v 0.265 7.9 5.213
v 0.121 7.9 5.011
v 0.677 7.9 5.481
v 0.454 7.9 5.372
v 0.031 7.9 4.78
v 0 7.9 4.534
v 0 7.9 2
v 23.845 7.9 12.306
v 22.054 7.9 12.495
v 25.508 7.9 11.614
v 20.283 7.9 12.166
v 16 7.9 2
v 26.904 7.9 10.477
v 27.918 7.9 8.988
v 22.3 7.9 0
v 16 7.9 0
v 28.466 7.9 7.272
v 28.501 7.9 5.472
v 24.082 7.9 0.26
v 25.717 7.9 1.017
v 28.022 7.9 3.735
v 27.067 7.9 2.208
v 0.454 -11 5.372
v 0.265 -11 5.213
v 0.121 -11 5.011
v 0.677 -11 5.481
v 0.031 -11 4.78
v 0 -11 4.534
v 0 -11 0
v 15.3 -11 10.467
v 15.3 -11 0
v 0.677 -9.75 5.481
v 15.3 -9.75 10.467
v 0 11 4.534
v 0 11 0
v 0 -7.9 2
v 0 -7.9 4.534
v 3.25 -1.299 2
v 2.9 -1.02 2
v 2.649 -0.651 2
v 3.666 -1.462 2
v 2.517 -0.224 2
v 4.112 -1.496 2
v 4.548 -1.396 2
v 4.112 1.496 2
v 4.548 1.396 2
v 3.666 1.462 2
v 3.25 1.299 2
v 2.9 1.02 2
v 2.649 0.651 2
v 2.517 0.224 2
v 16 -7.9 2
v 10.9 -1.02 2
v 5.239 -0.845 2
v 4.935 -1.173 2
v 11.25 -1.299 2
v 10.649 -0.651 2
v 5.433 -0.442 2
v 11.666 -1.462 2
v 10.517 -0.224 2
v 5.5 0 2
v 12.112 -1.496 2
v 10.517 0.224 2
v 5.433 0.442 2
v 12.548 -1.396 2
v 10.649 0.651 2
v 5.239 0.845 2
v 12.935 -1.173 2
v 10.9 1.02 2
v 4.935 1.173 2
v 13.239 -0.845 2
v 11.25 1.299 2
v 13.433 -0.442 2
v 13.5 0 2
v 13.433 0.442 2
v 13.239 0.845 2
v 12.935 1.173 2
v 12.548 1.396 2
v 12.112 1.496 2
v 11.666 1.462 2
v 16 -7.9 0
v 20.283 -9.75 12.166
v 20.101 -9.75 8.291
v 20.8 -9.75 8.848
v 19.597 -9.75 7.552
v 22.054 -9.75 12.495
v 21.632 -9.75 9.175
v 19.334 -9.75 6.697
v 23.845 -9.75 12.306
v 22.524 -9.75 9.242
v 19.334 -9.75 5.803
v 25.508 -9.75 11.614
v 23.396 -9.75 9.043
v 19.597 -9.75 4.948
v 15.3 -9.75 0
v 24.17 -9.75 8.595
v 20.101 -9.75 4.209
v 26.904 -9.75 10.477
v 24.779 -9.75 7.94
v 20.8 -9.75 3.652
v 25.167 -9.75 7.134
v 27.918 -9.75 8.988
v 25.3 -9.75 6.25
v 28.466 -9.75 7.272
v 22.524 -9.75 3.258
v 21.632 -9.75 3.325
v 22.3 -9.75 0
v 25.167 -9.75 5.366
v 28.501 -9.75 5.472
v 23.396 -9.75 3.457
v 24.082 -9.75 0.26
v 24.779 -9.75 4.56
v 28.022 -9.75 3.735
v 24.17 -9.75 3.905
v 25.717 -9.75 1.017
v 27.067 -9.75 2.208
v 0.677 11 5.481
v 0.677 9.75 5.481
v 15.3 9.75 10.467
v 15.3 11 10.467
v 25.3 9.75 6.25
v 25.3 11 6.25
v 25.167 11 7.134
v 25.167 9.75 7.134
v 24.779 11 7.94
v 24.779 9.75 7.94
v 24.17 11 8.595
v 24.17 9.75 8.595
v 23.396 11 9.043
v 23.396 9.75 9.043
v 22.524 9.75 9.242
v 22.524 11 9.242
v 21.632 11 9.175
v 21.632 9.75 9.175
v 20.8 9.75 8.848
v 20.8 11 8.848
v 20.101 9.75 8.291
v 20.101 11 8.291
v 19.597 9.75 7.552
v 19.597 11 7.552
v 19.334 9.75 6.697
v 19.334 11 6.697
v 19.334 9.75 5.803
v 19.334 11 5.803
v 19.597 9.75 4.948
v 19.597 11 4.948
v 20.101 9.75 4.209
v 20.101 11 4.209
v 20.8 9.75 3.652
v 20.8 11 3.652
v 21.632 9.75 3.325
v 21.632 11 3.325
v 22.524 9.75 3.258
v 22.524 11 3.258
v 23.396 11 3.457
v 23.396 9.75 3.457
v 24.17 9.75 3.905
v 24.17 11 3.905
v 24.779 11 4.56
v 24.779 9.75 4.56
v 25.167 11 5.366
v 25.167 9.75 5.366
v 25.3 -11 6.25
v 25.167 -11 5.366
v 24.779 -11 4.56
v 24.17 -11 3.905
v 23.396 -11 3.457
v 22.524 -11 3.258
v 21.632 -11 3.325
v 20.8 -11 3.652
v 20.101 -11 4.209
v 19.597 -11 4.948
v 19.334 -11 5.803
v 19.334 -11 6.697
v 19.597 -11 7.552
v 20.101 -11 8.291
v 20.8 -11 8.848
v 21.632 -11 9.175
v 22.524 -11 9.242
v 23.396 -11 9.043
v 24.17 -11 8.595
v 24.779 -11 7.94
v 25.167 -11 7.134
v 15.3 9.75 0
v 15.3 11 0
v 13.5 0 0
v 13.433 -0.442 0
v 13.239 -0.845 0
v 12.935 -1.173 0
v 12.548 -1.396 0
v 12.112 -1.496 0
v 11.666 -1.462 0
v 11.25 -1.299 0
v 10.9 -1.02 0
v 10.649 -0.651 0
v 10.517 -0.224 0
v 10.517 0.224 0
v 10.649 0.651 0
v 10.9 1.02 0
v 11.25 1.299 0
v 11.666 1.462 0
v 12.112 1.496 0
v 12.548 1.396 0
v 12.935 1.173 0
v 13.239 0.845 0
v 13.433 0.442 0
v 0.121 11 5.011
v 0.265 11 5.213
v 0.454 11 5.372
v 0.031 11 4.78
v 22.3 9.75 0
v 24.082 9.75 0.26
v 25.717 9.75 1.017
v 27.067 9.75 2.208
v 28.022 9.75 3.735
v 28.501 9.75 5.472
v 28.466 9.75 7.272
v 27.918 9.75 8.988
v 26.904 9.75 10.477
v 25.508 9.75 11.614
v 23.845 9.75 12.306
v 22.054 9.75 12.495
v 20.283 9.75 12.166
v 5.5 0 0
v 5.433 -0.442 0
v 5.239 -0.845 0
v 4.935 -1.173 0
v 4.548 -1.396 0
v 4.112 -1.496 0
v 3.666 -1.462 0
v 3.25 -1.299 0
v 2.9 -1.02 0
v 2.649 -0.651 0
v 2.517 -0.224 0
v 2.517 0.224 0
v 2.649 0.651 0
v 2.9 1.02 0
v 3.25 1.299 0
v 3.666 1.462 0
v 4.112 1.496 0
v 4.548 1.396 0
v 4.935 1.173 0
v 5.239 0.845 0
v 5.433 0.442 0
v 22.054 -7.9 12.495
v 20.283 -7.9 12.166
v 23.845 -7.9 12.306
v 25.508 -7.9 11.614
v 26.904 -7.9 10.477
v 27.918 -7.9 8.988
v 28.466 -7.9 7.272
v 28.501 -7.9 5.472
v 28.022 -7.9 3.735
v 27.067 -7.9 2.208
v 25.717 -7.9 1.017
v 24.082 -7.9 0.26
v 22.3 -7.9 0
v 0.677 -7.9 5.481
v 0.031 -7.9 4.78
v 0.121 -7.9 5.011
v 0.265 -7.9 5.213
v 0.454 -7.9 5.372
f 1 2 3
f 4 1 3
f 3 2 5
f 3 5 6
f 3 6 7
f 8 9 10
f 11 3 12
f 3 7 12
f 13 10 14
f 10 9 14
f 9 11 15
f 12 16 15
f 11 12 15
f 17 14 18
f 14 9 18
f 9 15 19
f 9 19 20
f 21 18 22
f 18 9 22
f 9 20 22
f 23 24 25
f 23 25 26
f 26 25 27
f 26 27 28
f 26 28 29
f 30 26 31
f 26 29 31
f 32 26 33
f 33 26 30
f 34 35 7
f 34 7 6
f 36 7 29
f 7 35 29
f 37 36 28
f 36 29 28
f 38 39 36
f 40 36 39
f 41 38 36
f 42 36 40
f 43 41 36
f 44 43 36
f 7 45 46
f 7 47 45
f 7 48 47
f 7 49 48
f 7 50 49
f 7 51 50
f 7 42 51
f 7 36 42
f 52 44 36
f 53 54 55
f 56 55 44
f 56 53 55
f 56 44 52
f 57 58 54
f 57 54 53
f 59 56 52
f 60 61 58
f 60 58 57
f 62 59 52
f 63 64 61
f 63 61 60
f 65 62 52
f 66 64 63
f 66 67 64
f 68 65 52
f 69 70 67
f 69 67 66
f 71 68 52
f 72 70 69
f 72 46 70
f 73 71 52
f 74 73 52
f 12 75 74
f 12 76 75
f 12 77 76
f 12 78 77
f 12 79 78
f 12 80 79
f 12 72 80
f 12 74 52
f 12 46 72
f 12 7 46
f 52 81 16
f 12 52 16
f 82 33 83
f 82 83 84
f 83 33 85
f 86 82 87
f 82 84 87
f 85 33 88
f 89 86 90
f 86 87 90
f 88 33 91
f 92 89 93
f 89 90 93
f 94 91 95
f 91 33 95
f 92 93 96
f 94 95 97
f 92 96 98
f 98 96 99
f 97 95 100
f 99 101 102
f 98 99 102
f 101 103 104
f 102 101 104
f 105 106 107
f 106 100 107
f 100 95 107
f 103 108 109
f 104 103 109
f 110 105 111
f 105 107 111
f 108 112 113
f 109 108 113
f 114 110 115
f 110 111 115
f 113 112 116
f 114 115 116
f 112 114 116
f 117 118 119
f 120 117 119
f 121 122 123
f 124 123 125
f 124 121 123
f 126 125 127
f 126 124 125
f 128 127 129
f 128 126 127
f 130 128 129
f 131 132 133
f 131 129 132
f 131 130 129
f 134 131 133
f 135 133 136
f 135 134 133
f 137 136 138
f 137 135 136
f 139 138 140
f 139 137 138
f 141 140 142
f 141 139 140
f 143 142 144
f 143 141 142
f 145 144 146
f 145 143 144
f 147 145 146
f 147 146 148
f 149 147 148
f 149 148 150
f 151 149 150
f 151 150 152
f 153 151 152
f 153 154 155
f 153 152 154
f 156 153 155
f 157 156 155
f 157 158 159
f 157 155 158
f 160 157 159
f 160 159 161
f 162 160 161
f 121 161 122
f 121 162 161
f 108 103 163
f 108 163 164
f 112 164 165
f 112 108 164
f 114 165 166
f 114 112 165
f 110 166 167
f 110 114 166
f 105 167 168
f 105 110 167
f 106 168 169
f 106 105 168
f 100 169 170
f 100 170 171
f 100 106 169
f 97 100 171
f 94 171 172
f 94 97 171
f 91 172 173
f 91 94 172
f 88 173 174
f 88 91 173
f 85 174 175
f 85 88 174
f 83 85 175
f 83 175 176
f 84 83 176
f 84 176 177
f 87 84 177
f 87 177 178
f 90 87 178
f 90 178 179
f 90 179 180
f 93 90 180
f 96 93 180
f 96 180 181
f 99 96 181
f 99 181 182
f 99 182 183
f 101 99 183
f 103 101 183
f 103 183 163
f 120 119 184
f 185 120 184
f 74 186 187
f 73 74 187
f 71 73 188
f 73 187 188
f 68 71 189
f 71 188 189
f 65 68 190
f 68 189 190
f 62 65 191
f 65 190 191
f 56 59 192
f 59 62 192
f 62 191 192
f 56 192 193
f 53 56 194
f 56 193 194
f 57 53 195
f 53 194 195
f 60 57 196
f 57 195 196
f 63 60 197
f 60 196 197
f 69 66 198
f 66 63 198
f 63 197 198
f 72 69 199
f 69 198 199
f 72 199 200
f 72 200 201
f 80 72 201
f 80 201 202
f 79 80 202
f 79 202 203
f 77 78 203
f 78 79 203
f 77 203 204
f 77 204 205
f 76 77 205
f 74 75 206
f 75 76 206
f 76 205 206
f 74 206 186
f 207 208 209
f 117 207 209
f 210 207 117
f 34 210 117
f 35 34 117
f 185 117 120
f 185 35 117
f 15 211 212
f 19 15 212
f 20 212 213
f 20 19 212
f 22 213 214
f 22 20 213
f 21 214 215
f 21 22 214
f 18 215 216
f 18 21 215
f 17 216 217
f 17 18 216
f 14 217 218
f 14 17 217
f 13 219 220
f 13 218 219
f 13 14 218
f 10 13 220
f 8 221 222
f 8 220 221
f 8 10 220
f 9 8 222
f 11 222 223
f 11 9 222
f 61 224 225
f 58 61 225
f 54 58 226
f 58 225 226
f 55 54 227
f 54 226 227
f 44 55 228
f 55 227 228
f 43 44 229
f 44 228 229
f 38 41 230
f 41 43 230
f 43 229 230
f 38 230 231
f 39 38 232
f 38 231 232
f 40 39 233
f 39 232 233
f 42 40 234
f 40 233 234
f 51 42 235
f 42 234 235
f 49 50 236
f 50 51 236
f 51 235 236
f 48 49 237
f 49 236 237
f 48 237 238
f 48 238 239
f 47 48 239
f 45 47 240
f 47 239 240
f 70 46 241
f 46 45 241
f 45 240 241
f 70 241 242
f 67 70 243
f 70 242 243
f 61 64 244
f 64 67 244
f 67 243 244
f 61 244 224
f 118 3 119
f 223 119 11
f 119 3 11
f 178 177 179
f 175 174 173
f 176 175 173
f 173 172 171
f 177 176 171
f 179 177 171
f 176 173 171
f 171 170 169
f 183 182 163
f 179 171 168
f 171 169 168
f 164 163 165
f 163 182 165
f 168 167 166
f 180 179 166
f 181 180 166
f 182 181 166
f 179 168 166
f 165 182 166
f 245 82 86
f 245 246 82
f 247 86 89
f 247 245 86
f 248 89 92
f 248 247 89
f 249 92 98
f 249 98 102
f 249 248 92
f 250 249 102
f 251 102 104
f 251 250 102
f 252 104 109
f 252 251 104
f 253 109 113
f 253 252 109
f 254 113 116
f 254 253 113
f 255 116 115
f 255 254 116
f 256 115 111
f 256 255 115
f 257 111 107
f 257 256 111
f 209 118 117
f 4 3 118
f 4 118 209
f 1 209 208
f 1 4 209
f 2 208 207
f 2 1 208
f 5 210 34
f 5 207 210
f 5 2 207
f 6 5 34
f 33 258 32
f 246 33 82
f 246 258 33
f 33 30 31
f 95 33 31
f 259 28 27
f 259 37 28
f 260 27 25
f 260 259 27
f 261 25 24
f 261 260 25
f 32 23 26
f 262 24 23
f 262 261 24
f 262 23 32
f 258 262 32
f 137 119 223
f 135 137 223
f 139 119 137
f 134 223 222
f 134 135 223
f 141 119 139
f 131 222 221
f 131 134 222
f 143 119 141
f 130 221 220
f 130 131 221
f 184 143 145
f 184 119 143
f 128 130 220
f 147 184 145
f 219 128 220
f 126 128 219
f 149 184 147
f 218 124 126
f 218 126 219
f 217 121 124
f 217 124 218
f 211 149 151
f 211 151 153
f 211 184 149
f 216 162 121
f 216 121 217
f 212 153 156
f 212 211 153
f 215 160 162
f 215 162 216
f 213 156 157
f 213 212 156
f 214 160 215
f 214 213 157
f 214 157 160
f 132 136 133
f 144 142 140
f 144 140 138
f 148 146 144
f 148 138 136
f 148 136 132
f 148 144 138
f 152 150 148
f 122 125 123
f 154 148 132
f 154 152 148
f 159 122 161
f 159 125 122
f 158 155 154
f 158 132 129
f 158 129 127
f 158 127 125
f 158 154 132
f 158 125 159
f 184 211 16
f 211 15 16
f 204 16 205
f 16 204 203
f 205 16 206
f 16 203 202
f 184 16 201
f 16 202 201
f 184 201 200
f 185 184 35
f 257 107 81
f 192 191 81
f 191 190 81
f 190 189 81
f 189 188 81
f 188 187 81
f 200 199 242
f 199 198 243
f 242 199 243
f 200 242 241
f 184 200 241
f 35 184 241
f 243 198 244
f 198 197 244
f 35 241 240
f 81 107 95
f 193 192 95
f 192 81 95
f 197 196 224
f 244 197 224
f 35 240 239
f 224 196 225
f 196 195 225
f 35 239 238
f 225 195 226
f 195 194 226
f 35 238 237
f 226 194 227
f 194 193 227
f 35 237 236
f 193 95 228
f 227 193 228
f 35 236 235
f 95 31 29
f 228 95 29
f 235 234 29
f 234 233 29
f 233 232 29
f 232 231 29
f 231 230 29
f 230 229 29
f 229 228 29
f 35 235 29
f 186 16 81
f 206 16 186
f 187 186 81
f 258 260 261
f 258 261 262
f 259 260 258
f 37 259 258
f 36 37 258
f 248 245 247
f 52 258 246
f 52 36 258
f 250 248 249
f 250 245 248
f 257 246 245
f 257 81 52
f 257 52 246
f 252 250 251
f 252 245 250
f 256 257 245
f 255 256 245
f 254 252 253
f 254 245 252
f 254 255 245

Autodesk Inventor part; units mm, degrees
sketch "Sketch_77" plane through (0, 0, 0) normal (0, 0, 1) x (1, 0, 0)
  line L0 (0, 7.9) -> (0, -7.9)
  line L1 (0, -7.9) -> (16, -7.9)
  line L2 (16, -7.9) -> (16, 7.9)
  line L3 (16, 7.9) -> (0, 7.9)
  circle A0 centre (12, 0) radius 1.5
  circle A1 centre (4, 0) radius 1.5
extrude "Extrusion1" add sketch "Sketch_77" along normal blind 2
sketch "Sketch_78" plane through (0, 7.9, 0) normal (0, 1, 0) x (1, 0, 0)
  arc A0 (0, -4.5344) -> (0.6773, -5.4809) centre (1, -4.5344) ccw
  line L0 (0.6773, -5.4809) -> (20.283, -12.1656)
  arc A1 (20.283, -12.1656) -> (22.3, 0) centre (22.3, -6.25) ccw
  line L1 (22.3, 0) -> (0, 0)
  line L2 (0, 0) -> (0, -4.5344)
extrude "Extrusion2" add sketch "Sketch_78" along normal blind 1.85
sketch "Sketch_79" plane through (0, -7.9, 0) normal (0, 1, 0) x (1, 0, 0)
  arc A0 (0, -4.5344) -> (0.6773, -5.4809) centre (1, -4.5344) ccw
  line L0 (0.6773, -5.4809) -> (20.283, -12.1656)
  arc A1 (20.283, -12.1656) -> (22.3, 0) centre (22.3, -6.25) ccw
  line L1 (22.3, 0) -> (0, 0)
  line L2 (0, 0) -> (0, -4.5344)
extrude "Extrusion3" add sketch "Sketch_79" against normal blind 1.85
sketch "Sketch_80" plane through (0, 9.6, 0) normal (0, 1, 0) x (1, 0, 0)
  circle A0 centre (22.3, -6.25) radius 3
extrude "Extrusion4" add sketch "Sketch_80" along normal blind 1.4
sketch "Sketch_81" plane through (0, -9.6, 0) normal (0, 1, 0) x (1, 0, 0)
  circle A0 centre (22.3, -6.25) radius 3
extrude "Extrusion5" add sketch "Sketch_81" along normal mid plane 2.8
sketch "Sketch_82" plane through (0, 9.6, 0) normal (0, 1, 0) x (1, 0, 0)
  arc A0 (0, -4.5344) -> (0.6773, -5.4809) centre (1, -4.5344) ccw
  line L0 (0.6773, -5.4809) -> (15.3, -10.4666)
  line L1 (15.3, -10.4666) -> (15.3, 0)
  line L2 (15.3, 0) -> (0, 0)
  line L3 (0, 0) -> (0, -4.5344)
extrude "Extrusion6" add sketch "Sketch_82" along normal blind 1.4
sketch "Sketch_83" plane through (0, -9.6, 0) normal (0, 1, 0) x (1, 0, 0)
  arc A0 (0, -4.5344) -> (0.6773, -5.4809) centre (1, -4.5344) ccw
  line L0 (0.6773, -5.4809) -> (15.3, -10.4666)
  line L1 (15.3, -10.4666) -> (15.3, 0)
  line L2 (15.3, 0) -> (0, 0)
  line L3 (0, 0) -> (0, -4.5344)
extrude "Extrusion7" add sketch "Sketch_83" along normal mid plane 2.8
ref_plane "end_2_XY" through (22.3, 10.5, 6.25) normal (0, 1, 0) x (1, 0, 0)
ref_plane "end_2_YZ" through (22.3, 10.5, 6.25) normal (1, 0, 0) x (0, 0, -1)
ref_plane "end_2_ZX" through (22.3, 10.5, 6.25) normal (0, 0, -1) x (0, 1, 0)
ref_plane "end_move_XY" through (22.3, -11.5, 6.25) normal (0, -1, 0) x (1, 0, 0)
ref_plane "end_move_YZ" through (22.3, -11.5, 6.25) normal (1, 0, 0) x (0, 0, 1)
ref_plane "end_move_ZX" through (22.3, -11.5, 6.25) normal (0, 0, 1) x (0, -1, 0)
ref_plane "to_dummy_XY" through (0, 0, 0) normal (0, 0, 1) x (1, 0, 0)
ref_plane "to_dummy_YZ" through (0, 0, 0) normal (1, 0, 0) x (0, 1, 0)
ref_plane "to_dummy_ZX" through (0, 0, 0) normal (0, 1, 0) x (0, 0, 1)
properties part number "045-16-2_se08f"
